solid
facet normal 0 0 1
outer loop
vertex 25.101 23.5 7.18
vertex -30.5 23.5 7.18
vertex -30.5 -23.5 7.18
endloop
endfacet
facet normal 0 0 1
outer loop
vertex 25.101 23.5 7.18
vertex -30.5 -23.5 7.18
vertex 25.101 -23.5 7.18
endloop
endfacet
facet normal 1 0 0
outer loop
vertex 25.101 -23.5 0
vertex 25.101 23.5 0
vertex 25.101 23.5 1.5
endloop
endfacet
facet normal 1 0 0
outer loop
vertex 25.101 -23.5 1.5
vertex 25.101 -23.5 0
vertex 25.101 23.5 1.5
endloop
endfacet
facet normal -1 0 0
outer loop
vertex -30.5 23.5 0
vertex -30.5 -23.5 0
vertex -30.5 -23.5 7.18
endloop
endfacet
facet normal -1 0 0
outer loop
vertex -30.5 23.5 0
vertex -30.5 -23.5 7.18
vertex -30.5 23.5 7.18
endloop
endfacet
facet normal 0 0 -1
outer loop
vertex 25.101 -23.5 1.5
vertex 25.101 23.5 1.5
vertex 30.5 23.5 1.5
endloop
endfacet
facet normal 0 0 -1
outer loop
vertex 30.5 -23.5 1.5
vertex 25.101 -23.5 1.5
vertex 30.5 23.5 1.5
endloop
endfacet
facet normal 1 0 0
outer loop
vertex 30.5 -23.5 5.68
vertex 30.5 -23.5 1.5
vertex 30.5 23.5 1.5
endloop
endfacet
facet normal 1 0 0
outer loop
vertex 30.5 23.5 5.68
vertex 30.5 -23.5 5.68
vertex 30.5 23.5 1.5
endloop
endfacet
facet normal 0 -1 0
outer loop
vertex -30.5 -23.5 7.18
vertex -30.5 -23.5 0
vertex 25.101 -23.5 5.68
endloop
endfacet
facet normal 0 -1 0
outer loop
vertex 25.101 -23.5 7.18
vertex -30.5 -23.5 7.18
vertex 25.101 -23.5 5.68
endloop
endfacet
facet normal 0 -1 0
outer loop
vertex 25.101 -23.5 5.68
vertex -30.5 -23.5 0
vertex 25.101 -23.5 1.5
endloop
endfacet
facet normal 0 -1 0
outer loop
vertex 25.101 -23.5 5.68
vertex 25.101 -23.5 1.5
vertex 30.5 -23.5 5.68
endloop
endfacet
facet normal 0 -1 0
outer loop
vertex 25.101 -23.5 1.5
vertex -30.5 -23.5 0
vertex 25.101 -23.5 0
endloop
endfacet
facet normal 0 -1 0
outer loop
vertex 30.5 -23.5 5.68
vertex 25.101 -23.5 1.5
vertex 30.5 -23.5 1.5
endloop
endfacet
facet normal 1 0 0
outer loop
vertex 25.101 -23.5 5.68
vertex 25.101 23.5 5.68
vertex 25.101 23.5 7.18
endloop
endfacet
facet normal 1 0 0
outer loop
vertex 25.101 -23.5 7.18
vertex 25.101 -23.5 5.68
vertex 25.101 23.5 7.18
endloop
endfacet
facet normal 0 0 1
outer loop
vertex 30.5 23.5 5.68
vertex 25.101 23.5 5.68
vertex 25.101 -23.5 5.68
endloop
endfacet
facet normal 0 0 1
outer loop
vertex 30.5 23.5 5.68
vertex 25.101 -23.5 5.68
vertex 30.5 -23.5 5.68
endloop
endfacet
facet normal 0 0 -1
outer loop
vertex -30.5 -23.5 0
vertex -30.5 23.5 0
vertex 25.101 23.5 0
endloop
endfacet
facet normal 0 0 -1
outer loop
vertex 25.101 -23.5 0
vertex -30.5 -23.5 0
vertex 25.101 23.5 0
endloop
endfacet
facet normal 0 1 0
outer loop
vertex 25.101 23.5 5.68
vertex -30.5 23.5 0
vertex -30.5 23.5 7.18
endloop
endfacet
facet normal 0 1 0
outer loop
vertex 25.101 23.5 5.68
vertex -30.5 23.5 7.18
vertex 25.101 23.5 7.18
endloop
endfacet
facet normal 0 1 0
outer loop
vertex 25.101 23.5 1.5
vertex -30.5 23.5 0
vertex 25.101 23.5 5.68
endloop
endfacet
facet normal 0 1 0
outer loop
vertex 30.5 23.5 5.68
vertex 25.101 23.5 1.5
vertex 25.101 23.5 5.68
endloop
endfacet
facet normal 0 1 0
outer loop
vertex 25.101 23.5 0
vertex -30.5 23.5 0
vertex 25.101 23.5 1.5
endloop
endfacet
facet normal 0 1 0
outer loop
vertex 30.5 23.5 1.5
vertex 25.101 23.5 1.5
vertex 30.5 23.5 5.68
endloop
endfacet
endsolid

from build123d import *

# Parameters (mm, degrees)
F0_W          = 61
F0_H          = 47
F1_DEPTH      = 7.18
F2_W          = 5.3985562474
F2_H          = 1.5
F3_DEPTH      = 23.501
F3_DEPTH_BACK = 23.501


with BuildPart() as f1:
    # F0 (on Top) → F1 (new body)
    with BuildSketch(Plane.XY):
        Rectangle(F0_W, F0_H)
    extrude(amount=F1_DEPTH)

    # F2 (on Front) → F3 (cut, two sides)
    with BuildSketch(Plane.XZ) as f3_sk:
        with Locations((27.8007218763, 0.75)):
            Rectangle(F2_W, F2_H)
        with Locations((27.8007218763, 6.43)):
            Rectangle(F2_W, F2_H)
    extrude(amount=-F3_DEPTH, mode=Mode.SUBTRACT)
    extrude(f3_sk.sketch, amount=F3_DEPTH_BACK, mode=Mode.SUBTRACT)


solid = f1.part
